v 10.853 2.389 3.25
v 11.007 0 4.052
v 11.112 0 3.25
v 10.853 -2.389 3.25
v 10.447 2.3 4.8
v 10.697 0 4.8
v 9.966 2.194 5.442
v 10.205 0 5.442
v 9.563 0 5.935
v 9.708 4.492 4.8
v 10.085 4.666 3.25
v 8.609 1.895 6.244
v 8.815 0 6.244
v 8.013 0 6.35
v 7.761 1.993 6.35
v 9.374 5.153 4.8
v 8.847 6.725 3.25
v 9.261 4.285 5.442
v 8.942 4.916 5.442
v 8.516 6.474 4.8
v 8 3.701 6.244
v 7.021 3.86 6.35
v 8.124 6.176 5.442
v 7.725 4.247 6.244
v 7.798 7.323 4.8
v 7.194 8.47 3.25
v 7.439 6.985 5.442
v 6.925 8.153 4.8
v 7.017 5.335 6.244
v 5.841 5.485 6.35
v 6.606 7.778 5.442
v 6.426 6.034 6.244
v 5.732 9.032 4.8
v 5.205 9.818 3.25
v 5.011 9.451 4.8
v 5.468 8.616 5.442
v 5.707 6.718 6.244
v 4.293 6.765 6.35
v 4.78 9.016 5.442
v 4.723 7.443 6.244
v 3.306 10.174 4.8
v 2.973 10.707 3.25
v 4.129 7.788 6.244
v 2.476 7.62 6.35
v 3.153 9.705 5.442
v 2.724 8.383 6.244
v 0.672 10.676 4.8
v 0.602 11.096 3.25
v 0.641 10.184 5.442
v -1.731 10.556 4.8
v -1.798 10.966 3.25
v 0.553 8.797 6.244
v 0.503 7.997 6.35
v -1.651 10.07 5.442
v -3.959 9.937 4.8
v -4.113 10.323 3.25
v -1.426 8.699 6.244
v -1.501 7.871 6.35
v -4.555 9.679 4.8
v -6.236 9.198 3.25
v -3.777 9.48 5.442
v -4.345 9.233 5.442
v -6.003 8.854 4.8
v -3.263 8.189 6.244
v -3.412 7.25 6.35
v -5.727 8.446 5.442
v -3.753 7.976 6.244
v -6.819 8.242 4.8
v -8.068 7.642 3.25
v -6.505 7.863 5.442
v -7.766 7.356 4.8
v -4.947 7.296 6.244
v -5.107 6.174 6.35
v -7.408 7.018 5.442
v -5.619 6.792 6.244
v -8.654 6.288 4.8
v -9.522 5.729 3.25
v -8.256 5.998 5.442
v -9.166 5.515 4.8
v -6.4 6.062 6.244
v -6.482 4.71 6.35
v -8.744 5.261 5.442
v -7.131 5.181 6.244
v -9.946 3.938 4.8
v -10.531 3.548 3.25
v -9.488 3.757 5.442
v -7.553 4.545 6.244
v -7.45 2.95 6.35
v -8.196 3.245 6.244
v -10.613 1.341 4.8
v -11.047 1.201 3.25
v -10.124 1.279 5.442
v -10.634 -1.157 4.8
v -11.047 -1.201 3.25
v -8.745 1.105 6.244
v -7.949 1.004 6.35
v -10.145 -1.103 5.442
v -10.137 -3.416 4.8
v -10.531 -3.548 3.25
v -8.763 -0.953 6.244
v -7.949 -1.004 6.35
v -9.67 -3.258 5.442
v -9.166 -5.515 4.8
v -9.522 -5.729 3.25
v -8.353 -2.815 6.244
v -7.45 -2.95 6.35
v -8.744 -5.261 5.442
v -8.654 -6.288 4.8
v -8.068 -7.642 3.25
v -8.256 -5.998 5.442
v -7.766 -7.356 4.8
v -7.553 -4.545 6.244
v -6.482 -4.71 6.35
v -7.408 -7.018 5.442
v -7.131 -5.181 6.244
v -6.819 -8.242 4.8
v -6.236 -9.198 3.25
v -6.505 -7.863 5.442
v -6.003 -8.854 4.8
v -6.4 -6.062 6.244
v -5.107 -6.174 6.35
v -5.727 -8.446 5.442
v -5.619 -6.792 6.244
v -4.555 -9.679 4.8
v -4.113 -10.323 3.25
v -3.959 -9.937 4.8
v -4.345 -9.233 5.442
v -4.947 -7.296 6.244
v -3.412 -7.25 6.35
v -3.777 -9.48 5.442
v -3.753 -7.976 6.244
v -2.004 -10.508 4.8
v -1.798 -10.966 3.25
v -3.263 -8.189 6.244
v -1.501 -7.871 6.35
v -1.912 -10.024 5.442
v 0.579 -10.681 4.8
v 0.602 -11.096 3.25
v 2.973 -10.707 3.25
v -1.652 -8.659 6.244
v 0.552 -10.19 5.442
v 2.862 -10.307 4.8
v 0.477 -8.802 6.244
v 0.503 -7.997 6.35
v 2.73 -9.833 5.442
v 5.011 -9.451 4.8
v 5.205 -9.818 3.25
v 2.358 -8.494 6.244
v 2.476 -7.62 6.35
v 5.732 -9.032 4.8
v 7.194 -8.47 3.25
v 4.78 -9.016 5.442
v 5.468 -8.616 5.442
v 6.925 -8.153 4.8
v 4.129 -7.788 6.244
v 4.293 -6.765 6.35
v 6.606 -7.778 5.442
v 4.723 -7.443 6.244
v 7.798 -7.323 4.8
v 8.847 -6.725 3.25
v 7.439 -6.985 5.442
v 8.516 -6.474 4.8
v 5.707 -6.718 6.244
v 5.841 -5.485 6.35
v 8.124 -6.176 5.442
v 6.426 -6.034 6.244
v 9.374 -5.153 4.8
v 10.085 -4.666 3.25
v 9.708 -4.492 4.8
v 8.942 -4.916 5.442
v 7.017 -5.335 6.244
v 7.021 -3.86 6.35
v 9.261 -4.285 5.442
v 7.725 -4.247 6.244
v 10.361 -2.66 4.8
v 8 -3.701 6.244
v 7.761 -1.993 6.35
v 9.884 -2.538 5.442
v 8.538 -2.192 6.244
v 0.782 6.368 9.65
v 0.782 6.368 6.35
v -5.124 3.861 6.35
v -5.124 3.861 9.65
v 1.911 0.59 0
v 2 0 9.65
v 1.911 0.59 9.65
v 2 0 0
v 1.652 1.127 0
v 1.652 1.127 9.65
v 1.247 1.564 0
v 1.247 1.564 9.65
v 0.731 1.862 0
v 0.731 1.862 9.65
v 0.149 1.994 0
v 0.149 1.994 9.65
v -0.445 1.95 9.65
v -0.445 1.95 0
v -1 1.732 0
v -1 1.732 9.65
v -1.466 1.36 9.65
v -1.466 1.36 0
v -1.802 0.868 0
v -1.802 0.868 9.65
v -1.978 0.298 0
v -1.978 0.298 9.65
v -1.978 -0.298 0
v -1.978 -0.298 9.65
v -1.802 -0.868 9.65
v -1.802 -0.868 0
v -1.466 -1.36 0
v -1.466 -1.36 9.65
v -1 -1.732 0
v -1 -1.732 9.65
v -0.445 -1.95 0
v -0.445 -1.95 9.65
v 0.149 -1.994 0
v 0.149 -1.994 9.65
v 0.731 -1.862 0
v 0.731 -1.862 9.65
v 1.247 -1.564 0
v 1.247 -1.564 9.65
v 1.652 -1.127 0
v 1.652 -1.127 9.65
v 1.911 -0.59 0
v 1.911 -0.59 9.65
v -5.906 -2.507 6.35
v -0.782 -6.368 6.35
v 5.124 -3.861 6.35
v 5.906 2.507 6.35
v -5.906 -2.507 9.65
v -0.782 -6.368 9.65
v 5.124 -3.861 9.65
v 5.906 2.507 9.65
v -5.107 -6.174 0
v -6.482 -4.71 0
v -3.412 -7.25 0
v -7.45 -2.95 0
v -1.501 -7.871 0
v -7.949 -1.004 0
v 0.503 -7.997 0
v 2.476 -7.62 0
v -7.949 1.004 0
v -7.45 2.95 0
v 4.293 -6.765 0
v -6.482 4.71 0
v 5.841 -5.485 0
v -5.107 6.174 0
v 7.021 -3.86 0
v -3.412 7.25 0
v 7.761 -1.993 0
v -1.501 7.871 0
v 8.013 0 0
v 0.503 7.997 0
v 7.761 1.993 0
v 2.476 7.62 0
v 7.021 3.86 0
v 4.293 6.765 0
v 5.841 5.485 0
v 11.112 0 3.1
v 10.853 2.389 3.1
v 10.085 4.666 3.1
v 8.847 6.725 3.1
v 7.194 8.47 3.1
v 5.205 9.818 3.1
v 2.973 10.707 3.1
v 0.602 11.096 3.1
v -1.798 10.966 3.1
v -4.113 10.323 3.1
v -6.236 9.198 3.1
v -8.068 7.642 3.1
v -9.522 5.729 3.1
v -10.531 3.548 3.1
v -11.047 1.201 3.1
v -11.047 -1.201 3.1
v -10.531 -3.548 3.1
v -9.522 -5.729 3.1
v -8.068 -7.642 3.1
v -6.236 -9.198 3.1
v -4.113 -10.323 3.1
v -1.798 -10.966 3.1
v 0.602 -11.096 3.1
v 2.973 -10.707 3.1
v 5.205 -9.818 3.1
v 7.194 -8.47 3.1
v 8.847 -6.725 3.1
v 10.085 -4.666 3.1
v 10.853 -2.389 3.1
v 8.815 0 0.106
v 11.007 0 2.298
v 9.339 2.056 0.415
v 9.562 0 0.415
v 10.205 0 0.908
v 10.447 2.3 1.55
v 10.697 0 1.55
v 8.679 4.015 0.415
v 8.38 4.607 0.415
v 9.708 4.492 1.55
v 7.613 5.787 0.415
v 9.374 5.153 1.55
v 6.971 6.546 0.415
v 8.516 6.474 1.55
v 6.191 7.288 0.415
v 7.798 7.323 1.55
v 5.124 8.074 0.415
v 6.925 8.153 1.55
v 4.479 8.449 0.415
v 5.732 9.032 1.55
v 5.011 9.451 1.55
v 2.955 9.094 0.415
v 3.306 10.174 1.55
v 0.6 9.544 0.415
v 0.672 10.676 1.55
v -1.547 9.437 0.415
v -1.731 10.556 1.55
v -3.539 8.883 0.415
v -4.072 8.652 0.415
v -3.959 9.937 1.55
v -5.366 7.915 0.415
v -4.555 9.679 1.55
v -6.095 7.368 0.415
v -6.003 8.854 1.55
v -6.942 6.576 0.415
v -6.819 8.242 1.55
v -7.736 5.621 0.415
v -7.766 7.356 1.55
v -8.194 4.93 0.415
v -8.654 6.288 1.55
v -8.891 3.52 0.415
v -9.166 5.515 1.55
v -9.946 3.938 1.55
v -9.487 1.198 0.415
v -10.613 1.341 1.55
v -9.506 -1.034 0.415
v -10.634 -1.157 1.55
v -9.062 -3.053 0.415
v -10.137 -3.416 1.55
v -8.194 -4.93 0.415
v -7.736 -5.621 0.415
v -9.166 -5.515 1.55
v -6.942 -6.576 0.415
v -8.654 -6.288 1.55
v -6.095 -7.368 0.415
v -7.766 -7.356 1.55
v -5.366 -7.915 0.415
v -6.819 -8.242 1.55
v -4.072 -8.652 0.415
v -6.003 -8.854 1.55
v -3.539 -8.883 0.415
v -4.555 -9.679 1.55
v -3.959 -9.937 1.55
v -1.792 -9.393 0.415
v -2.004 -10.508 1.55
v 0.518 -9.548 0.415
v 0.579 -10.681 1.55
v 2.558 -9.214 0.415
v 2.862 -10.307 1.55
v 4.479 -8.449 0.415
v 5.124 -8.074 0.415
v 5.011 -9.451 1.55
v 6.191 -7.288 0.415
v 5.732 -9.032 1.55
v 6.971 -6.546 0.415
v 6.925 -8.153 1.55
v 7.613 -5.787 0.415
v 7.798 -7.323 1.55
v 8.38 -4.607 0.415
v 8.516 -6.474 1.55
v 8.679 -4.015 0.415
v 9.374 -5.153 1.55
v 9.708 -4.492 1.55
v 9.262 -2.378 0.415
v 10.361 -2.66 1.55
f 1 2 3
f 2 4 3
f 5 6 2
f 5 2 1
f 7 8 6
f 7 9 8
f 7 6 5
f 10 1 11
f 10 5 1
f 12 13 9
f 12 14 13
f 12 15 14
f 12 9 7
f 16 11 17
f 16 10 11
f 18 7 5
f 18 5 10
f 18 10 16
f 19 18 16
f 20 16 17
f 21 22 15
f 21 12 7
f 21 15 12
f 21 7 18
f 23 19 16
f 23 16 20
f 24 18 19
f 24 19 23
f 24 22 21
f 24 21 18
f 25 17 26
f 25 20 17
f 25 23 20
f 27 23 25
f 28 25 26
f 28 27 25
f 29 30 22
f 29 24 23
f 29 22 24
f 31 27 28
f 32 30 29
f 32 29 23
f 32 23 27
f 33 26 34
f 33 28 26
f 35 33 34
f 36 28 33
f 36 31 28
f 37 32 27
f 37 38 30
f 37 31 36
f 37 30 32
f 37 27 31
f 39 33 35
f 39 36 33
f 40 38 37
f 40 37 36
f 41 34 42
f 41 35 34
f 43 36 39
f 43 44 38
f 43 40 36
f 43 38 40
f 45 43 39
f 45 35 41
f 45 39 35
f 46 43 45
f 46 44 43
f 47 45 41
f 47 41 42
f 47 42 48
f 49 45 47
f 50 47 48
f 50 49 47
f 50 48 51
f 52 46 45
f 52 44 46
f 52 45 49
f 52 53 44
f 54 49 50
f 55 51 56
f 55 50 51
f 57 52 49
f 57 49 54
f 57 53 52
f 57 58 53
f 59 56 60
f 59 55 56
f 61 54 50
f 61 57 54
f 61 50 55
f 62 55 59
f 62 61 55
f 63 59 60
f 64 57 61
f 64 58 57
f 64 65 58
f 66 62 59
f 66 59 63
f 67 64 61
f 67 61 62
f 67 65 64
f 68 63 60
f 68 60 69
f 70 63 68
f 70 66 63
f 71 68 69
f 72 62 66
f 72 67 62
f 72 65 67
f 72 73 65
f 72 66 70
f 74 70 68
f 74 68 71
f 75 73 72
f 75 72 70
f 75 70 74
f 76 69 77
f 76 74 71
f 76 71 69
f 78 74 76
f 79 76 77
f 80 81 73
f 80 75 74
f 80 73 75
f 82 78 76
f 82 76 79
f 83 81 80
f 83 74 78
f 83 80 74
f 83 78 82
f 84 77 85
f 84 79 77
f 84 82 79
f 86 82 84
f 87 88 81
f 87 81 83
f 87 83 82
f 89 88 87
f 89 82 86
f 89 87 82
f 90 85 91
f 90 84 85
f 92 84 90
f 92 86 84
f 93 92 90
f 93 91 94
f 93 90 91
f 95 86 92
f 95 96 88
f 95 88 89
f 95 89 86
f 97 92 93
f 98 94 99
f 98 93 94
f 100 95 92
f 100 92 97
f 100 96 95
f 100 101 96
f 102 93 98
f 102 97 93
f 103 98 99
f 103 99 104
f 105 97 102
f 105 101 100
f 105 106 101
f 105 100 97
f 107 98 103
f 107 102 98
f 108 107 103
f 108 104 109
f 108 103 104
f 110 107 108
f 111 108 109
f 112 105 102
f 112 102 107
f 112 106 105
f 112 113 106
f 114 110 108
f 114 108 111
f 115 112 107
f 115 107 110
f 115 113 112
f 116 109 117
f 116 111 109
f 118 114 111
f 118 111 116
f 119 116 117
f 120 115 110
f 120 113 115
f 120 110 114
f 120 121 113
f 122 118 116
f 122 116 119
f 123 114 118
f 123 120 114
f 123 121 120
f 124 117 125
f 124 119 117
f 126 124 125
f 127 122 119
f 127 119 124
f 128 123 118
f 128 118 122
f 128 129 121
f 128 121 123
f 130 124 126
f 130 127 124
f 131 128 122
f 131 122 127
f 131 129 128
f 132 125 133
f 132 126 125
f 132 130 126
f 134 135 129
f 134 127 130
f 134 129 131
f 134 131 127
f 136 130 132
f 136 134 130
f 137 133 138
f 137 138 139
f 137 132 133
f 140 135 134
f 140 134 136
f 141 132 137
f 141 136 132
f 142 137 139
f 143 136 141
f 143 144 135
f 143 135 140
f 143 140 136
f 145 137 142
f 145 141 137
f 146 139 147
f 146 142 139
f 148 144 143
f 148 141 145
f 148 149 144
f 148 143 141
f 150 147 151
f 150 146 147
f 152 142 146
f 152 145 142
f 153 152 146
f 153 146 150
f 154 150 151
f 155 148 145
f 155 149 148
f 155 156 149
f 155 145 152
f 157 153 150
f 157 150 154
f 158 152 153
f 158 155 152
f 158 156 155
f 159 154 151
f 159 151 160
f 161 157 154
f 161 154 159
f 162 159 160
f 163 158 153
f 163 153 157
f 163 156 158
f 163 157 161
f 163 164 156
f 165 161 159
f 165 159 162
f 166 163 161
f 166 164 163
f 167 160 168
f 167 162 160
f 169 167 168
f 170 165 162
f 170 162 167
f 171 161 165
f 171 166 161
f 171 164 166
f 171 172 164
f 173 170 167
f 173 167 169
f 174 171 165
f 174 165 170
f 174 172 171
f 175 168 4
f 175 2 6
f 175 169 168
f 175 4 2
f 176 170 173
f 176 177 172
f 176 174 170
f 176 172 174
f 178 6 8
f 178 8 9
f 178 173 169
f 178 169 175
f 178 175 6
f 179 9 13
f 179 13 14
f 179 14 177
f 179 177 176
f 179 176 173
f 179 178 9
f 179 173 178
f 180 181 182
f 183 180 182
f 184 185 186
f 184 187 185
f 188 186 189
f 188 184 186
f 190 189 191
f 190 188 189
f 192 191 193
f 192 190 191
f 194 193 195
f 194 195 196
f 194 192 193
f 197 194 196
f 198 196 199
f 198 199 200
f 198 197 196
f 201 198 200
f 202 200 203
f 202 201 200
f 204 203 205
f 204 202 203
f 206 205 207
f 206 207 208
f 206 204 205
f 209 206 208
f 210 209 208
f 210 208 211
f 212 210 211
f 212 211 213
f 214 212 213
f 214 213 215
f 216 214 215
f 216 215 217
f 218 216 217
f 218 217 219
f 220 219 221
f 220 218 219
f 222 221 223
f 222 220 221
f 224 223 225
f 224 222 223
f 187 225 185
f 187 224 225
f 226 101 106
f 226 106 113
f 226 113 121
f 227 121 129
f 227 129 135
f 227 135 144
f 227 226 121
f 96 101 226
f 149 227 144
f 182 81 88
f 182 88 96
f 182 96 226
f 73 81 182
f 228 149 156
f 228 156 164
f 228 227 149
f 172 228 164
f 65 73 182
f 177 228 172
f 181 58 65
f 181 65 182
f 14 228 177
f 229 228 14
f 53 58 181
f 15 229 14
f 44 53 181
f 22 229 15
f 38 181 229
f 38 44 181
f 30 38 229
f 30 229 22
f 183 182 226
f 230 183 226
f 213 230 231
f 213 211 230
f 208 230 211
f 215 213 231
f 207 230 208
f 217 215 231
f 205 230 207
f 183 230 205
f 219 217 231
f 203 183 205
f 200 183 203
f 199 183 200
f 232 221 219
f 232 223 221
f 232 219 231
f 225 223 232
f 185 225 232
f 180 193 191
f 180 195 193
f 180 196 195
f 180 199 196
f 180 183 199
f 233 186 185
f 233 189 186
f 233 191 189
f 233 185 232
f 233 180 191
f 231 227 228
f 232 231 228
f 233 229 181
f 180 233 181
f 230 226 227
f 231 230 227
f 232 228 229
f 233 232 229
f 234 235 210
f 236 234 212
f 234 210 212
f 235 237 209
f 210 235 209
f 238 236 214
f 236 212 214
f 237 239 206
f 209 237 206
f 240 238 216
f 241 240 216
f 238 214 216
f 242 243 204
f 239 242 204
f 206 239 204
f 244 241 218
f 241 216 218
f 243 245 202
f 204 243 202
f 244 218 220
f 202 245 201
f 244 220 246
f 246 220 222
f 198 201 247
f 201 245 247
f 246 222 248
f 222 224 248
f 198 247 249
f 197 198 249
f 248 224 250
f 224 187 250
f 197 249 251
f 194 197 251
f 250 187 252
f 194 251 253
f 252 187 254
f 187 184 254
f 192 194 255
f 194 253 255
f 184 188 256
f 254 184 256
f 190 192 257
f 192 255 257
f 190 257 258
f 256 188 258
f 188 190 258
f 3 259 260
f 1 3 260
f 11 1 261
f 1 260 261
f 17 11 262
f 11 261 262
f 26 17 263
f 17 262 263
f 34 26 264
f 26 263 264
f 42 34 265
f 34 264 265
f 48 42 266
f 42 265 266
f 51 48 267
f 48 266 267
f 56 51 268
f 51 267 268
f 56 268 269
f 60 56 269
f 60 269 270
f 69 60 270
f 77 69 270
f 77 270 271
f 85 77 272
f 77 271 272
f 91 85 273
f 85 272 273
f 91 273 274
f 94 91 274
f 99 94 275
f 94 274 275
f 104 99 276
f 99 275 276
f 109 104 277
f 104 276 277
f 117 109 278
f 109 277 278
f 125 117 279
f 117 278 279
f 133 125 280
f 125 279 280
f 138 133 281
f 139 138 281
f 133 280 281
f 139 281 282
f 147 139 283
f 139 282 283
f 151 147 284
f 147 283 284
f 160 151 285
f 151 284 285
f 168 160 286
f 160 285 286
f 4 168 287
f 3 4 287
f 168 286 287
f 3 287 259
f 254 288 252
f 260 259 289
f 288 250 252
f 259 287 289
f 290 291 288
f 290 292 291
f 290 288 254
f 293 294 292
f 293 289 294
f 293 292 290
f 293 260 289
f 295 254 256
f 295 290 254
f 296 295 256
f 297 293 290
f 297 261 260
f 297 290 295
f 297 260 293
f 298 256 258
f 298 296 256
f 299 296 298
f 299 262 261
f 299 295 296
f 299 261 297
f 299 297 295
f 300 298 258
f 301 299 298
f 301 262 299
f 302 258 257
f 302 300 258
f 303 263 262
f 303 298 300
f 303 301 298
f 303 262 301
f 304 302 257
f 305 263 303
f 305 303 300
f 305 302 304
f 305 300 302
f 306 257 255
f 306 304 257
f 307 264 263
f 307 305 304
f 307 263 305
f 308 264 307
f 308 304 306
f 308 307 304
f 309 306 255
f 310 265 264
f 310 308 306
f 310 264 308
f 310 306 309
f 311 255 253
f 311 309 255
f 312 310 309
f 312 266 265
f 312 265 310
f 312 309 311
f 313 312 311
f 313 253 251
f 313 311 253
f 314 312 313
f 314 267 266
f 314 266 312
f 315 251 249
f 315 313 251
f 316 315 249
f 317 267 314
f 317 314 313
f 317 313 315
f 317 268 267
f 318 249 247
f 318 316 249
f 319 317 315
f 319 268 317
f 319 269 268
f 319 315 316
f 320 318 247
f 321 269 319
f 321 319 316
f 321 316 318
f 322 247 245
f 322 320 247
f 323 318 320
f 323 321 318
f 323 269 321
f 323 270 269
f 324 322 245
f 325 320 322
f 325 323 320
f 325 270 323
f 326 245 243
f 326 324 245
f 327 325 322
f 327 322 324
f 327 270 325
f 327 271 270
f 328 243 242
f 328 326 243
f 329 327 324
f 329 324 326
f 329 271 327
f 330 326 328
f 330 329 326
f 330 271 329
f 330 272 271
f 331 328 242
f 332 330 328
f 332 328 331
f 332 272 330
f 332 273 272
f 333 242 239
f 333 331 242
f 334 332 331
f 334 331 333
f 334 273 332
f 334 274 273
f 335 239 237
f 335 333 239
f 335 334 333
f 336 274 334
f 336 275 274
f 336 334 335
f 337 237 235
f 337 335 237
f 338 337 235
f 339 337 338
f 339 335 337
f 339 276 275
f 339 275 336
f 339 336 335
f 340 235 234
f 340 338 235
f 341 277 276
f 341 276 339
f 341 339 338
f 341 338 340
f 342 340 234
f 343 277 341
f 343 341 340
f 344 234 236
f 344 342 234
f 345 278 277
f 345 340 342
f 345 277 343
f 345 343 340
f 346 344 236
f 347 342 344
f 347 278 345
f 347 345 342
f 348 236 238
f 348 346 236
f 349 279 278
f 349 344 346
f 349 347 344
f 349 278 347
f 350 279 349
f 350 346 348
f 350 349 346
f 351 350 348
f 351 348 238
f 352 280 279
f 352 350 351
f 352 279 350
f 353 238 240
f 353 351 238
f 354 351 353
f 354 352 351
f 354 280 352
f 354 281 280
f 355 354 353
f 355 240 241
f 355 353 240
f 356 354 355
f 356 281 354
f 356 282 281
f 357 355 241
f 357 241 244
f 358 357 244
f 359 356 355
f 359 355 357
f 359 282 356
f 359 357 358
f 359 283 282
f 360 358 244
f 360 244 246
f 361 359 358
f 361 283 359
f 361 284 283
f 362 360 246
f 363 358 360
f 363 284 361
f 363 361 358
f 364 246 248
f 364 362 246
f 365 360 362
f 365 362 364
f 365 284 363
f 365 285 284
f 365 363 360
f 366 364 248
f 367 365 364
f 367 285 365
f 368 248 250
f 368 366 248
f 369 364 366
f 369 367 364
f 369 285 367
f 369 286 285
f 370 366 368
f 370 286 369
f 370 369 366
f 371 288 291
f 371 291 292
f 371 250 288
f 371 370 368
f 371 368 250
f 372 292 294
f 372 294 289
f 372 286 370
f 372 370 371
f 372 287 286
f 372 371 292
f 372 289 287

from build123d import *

# Parameters (mm, degrees)
F0_R     = 11.1125
F0_R_2   = 2
F1_DEPTH = 6.35
F2_R     = 2
F3_DEPTH = 3.3
F4_R     = 3.1


with BuildPart() as f1:
    # F0 (on Top) → F1 (new body)
    with BuildSketch(Plane.XY):
        Circle(F0_R)
        Circle(F0_R_2, mode=Mode.SUBTRACT)
    extrude(amount=F1_DEPTH)

    # F2 (on face) → F3 (join)
    with BuildSketch(Plane.XY.offset(6.35)):
        Polygon((-5.123777, 3.861277), (-5.905853, -2.506682), (-0.782076, -6.36796), (5.123777, -3.861277), (5.905853, 2.506682), (0.782076, 6.36796), align=None)
        Circle(F2_R, mode=Mode.SUBTRACT)
    extrude(amount=F3_DEPTH)

    # F4
    f4_edges = [f1.edges().sort_by_distance(p)[0] for p in [
        (-11.1125, 0, 0),
        (-11.1125, 0, 6.35),
    ]]
    fillet(f4_edges, radius=F4_R)


solid = f1.part
